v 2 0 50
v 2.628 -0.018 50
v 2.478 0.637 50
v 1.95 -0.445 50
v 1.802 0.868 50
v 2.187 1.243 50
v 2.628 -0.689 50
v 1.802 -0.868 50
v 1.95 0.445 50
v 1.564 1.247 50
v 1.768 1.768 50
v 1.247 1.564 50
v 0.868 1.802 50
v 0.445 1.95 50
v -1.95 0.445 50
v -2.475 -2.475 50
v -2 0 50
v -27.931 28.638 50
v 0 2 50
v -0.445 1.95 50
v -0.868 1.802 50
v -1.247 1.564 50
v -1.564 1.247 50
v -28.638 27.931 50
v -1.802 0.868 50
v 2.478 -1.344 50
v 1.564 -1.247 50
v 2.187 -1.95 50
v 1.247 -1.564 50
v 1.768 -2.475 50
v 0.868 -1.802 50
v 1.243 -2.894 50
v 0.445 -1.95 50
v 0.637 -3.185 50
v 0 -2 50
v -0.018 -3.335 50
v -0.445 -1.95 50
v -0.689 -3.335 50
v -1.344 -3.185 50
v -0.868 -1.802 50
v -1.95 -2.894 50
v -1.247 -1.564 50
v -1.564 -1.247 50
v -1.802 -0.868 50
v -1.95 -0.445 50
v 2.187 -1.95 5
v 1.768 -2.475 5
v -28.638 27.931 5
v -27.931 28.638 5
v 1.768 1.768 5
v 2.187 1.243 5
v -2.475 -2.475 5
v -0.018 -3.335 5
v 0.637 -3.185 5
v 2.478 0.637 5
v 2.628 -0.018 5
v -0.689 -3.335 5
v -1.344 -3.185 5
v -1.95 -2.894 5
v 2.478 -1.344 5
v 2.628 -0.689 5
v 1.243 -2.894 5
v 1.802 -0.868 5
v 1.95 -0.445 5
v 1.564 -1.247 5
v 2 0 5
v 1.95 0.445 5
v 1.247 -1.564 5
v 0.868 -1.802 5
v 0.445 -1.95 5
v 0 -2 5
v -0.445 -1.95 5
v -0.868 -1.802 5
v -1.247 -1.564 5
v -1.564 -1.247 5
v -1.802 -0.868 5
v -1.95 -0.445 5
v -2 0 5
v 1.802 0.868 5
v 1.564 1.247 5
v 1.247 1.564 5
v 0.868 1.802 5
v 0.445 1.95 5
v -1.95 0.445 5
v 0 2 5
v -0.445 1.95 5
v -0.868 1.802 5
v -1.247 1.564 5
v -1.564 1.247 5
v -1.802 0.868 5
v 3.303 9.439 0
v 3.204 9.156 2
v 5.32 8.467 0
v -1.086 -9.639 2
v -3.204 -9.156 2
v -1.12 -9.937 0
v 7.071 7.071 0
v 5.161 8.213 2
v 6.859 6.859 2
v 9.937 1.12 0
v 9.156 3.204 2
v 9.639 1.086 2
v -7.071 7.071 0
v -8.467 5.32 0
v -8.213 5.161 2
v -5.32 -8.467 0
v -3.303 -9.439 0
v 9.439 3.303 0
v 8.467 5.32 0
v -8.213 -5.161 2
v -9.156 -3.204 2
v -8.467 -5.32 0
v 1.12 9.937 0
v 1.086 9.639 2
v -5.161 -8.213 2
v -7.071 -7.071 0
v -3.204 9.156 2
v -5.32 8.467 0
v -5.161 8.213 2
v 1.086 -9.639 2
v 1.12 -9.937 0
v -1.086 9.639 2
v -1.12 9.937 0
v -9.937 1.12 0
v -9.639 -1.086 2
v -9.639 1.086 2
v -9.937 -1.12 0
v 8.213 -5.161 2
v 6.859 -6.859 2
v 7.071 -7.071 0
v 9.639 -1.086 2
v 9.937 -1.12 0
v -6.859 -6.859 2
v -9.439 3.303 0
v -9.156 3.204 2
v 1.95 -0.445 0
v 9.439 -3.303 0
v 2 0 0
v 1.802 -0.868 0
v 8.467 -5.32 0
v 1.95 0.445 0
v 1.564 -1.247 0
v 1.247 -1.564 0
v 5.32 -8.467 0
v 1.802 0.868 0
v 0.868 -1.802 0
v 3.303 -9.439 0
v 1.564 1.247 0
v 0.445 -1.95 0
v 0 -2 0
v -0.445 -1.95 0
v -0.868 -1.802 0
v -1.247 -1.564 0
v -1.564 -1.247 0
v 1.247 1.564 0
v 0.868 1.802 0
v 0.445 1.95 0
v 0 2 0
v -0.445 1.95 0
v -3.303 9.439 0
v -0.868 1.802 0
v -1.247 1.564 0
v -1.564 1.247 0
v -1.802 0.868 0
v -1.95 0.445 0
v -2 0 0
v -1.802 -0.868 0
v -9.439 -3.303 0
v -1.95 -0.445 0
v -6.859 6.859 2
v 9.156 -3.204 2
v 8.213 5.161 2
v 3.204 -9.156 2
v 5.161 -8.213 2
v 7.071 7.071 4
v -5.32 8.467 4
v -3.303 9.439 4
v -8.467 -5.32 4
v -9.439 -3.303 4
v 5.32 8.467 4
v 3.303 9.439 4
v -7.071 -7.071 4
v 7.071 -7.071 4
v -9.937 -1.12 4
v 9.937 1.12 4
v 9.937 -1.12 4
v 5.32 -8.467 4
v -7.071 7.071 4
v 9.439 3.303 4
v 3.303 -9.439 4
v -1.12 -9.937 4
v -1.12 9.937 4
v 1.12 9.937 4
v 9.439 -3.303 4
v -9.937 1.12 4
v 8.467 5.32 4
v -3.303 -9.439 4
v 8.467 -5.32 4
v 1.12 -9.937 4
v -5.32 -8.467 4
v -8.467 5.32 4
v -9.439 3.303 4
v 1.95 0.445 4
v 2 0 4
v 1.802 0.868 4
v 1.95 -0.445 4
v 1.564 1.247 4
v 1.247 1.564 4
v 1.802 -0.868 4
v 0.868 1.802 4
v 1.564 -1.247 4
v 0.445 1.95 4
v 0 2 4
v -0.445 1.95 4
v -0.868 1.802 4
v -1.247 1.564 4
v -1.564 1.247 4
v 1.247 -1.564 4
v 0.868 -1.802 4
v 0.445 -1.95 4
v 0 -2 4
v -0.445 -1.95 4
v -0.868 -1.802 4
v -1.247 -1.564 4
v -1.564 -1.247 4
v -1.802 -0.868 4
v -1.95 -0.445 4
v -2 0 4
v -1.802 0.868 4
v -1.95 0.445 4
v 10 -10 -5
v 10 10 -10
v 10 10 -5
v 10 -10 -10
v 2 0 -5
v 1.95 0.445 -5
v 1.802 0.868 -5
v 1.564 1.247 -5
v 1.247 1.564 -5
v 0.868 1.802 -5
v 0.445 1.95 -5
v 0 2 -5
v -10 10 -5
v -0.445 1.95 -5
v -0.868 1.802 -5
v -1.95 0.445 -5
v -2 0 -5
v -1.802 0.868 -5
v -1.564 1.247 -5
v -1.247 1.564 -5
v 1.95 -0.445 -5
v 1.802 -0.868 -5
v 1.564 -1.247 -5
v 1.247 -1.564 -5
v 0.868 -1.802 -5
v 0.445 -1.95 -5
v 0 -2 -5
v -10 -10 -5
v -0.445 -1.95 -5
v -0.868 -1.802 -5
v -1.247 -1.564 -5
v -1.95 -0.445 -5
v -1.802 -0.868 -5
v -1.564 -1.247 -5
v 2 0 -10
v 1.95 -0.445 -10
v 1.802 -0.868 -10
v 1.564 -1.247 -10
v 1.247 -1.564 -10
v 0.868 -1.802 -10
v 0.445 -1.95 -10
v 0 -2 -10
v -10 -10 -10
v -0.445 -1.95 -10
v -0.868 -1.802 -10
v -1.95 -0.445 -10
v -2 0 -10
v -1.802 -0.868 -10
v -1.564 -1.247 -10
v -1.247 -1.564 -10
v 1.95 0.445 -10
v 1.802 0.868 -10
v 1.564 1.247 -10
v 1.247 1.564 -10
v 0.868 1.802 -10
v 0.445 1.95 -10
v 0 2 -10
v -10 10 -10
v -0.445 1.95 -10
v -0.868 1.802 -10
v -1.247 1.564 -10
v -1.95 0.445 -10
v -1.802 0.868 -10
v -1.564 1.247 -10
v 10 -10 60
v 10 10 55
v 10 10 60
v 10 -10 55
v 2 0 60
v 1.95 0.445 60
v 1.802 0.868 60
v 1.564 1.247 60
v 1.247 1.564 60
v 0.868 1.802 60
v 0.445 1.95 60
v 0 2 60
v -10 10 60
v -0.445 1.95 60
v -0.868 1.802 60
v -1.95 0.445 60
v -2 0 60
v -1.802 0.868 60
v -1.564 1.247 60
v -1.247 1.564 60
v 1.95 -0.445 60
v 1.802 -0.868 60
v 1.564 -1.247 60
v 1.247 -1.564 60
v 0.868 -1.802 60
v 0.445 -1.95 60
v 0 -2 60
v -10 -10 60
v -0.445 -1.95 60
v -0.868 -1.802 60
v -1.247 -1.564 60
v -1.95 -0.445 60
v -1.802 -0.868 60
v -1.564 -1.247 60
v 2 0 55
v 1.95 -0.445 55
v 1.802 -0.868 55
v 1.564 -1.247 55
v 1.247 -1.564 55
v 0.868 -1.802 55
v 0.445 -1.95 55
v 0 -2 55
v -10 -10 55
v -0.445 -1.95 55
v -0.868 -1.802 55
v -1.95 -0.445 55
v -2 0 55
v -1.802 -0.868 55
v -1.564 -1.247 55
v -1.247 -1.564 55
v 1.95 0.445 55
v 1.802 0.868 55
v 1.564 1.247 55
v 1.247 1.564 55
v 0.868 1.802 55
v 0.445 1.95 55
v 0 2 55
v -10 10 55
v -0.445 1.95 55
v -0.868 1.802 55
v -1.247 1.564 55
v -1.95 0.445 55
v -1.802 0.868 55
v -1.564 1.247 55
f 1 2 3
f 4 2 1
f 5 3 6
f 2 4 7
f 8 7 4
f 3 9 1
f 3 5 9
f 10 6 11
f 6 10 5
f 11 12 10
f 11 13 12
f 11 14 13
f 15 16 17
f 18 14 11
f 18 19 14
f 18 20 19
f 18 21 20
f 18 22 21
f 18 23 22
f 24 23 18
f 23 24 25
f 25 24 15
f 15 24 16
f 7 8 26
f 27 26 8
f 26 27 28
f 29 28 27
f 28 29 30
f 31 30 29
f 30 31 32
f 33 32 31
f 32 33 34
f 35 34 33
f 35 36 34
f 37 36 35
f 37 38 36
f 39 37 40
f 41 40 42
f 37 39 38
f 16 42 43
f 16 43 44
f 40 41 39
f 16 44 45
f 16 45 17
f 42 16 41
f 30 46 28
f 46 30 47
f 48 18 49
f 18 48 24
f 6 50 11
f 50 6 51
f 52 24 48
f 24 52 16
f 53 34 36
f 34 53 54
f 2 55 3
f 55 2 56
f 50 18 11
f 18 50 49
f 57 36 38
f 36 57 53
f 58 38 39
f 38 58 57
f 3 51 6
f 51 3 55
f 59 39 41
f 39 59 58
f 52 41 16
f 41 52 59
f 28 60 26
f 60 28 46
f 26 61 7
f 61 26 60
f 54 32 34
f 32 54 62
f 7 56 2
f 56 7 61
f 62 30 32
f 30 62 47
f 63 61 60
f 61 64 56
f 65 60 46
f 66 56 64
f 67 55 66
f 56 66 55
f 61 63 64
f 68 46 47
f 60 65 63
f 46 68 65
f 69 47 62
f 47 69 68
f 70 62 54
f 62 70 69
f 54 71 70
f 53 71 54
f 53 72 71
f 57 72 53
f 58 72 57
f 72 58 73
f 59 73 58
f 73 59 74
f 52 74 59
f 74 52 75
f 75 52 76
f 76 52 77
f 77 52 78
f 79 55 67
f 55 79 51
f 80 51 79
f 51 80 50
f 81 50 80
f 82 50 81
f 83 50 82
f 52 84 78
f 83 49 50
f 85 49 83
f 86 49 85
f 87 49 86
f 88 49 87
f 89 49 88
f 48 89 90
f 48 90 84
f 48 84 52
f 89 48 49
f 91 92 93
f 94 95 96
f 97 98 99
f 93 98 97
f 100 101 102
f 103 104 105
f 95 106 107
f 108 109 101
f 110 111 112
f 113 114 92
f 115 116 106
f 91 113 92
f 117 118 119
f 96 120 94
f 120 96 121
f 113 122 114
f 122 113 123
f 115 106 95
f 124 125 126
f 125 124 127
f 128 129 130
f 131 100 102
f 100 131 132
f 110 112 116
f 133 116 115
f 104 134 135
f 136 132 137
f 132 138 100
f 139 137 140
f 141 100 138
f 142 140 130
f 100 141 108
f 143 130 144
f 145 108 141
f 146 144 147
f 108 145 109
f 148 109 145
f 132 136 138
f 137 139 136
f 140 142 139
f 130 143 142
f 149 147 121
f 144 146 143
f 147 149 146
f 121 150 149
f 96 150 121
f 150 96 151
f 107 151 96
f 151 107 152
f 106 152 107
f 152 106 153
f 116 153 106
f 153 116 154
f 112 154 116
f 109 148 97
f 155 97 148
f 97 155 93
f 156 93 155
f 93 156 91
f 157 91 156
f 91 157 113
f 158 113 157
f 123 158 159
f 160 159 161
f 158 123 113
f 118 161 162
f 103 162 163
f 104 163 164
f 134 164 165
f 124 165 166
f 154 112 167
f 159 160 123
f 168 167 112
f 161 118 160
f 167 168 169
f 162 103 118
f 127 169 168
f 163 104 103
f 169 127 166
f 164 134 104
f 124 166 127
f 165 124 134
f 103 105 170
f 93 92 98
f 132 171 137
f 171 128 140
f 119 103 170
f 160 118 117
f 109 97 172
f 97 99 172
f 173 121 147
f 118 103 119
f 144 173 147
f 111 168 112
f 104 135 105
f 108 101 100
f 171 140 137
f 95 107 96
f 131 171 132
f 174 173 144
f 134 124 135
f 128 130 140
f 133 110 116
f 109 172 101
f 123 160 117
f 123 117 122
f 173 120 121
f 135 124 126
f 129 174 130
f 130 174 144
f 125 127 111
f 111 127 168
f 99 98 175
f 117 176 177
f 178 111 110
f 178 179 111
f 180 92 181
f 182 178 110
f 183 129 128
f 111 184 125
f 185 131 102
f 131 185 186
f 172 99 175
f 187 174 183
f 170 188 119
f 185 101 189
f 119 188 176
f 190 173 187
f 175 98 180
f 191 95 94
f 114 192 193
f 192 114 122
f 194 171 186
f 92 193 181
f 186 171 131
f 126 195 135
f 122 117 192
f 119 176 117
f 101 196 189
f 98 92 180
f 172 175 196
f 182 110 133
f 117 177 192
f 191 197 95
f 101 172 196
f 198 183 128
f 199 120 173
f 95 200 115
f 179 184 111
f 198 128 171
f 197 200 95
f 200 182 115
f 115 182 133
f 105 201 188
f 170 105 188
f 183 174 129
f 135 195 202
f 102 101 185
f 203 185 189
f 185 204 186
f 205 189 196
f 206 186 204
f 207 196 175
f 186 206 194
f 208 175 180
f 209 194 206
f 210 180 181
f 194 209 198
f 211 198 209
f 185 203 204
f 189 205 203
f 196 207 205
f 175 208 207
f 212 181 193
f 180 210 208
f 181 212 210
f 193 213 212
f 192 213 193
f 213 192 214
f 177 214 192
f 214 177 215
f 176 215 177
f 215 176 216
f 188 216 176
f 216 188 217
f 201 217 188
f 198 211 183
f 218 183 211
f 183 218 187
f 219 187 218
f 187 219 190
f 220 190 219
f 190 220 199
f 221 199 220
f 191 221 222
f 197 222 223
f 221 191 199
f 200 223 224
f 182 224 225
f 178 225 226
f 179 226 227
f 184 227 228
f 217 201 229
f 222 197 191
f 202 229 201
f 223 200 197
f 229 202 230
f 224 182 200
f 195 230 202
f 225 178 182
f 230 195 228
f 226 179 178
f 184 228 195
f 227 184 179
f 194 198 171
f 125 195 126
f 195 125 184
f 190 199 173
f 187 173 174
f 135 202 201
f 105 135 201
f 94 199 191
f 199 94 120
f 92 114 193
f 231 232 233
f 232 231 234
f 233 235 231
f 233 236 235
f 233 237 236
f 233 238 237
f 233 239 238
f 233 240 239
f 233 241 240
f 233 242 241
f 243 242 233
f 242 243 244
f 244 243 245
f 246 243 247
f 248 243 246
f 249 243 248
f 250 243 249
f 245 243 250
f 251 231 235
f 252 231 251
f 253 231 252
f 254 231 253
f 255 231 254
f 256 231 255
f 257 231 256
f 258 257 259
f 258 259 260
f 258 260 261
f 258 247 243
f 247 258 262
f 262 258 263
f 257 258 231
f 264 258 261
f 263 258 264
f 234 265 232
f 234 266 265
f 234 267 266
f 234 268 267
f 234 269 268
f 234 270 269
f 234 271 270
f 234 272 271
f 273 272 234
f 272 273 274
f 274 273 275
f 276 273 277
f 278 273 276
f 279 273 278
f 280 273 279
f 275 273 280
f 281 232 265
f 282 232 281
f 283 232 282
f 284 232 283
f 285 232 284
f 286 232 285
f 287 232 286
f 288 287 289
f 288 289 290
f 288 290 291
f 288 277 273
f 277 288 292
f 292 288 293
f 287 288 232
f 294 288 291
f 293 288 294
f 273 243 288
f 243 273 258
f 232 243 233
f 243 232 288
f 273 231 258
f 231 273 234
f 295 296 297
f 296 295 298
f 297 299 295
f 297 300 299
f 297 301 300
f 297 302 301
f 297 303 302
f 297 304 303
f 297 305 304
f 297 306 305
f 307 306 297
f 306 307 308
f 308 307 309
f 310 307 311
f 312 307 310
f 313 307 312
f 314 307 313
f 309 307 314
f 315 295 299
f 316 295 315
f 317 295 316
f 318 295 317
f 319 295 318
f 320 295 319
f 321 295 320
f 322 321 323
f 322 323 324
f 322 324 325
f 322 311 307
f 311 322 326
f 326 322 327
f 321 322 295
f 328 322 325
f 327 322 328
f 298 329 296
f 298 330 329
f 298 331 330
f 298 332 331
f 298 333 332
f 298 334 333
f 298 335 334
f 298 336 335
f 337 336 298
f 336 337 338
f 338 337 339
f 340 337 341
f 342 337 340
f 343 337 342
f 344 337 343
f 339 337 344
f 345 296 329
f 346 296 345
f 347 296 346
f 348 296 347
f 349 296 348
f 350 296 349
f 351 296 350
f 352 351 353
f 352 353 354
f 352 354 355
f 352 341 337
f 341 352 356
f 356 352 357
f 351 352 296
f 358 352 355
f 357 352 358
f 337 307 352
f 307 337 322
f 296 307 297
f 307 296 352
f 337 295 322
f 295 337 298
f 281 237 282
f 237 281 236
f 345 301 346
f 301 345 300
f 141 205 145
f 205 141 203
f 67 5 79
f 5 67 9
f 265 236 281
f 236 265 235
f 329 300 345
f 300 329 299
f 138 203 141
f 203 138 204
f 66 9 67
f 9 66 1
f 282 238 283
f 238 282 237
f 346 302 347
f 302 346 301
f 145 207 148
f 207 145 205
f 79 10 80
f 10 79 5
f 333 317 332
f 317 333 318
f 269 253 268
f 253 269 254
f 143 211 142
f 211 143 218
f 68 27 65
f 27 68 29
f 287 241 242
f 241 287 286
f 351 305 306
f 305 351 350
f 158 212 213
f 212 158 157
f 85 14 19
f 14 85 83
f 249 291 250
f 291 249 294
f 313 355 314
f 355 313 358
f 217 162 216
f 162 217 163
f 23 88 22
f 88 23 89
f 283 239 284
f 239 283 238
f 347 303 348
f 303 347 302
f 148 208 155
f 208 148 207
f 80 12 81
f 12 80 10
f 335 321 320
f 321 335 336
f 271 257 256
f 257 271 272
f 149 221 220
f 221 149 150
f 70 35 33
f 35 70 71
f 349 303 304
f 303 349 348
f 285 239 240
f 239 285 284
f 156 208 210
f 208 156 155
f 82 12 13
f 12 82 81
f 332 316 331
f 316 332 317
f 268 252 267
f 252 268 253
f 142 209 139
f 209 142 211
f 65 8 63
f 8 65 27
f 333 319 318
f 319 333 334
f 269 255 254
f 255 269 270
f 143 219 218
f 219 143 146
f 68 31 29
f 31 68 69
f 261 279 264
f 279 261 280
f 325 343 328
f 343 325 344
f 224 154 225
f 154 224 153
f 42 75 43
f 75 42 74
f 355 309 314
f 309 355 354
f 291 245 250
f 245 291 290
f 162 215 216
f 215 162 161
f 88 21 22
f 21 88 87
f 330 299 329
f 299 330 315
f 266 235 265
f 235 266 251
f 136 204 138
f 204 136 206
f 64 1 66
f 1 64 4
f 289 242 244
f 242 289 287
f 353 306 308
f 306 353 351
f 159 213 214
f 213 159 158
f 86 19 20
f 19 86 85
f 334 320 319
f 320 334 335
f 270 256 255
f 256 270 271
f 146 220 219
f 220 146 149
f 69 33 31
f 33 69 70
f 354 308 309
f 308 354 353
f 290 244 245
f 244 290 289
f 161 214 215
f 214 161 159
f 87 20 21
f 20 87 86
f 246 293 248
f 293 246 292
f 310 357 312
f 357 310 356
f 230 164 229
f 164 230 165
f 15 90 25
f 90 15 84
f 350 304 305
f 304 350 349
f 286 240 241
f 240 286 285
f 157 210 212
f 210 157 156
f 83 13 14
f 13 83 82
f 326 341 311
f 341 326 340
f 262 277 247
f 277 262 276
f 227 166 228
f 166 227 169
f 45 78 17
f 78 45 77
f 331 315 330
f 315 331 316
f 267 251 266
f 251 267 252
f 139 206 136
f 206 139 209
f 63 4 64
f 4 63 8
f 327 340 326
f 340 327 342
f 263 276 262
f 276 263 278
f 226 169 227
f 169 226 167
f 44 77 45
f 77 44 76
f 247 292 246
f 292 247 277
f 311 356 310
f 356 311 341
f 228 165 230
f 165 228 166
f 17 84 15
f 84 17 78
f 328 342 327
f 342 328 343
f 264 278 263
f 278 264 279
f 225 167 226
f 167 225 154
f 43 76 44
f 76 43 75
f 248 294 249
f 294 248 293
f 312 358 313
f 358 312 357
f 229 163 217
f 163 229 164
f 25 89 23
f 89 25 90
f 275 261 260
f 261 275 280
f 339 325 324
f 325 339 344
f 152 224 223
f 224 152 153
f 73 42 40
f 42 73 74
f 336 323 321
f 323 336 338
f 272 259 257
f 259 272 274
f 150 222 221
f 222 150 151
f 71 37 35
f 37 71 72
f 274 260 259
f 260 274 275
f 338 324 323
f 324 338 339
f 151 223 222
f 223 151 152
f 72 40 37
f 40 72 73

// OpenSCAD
$fn=28;


function rotation(t) = (t < 0.5)
    ? t * 45 * 4
    : (1-t) * 45 * 4;


difference()
{
    union()
    {
        r = rotation($t);
        rotate([0,0,45+r])
        rudder();
        holders();
    }

    translate([0,0,-10])
    #cylinder(d=4,h=70);
}

module holders()
{
    translate([-20/2,-20/2,-10])
    cube([20,20,5]);
    
    translate([-20/2,-20/2,50+5])
    cube([20,20,5]);
}

module rudder()
{
    hull()
    {
        translate([-1/2,0,5])
        {
            cube([1,40,45]);
            cylinder(d=6,h=45);
        }
    }

    rotator_diameter = 20;
    cylinder(d1=rotator_diameter,d2=rotator_diameter*0.97,h=2);
    translate([0,0,2])
    cylinder(d1=rotator_diameter*0.97,d2=rotator_diameter,h=2);
}
